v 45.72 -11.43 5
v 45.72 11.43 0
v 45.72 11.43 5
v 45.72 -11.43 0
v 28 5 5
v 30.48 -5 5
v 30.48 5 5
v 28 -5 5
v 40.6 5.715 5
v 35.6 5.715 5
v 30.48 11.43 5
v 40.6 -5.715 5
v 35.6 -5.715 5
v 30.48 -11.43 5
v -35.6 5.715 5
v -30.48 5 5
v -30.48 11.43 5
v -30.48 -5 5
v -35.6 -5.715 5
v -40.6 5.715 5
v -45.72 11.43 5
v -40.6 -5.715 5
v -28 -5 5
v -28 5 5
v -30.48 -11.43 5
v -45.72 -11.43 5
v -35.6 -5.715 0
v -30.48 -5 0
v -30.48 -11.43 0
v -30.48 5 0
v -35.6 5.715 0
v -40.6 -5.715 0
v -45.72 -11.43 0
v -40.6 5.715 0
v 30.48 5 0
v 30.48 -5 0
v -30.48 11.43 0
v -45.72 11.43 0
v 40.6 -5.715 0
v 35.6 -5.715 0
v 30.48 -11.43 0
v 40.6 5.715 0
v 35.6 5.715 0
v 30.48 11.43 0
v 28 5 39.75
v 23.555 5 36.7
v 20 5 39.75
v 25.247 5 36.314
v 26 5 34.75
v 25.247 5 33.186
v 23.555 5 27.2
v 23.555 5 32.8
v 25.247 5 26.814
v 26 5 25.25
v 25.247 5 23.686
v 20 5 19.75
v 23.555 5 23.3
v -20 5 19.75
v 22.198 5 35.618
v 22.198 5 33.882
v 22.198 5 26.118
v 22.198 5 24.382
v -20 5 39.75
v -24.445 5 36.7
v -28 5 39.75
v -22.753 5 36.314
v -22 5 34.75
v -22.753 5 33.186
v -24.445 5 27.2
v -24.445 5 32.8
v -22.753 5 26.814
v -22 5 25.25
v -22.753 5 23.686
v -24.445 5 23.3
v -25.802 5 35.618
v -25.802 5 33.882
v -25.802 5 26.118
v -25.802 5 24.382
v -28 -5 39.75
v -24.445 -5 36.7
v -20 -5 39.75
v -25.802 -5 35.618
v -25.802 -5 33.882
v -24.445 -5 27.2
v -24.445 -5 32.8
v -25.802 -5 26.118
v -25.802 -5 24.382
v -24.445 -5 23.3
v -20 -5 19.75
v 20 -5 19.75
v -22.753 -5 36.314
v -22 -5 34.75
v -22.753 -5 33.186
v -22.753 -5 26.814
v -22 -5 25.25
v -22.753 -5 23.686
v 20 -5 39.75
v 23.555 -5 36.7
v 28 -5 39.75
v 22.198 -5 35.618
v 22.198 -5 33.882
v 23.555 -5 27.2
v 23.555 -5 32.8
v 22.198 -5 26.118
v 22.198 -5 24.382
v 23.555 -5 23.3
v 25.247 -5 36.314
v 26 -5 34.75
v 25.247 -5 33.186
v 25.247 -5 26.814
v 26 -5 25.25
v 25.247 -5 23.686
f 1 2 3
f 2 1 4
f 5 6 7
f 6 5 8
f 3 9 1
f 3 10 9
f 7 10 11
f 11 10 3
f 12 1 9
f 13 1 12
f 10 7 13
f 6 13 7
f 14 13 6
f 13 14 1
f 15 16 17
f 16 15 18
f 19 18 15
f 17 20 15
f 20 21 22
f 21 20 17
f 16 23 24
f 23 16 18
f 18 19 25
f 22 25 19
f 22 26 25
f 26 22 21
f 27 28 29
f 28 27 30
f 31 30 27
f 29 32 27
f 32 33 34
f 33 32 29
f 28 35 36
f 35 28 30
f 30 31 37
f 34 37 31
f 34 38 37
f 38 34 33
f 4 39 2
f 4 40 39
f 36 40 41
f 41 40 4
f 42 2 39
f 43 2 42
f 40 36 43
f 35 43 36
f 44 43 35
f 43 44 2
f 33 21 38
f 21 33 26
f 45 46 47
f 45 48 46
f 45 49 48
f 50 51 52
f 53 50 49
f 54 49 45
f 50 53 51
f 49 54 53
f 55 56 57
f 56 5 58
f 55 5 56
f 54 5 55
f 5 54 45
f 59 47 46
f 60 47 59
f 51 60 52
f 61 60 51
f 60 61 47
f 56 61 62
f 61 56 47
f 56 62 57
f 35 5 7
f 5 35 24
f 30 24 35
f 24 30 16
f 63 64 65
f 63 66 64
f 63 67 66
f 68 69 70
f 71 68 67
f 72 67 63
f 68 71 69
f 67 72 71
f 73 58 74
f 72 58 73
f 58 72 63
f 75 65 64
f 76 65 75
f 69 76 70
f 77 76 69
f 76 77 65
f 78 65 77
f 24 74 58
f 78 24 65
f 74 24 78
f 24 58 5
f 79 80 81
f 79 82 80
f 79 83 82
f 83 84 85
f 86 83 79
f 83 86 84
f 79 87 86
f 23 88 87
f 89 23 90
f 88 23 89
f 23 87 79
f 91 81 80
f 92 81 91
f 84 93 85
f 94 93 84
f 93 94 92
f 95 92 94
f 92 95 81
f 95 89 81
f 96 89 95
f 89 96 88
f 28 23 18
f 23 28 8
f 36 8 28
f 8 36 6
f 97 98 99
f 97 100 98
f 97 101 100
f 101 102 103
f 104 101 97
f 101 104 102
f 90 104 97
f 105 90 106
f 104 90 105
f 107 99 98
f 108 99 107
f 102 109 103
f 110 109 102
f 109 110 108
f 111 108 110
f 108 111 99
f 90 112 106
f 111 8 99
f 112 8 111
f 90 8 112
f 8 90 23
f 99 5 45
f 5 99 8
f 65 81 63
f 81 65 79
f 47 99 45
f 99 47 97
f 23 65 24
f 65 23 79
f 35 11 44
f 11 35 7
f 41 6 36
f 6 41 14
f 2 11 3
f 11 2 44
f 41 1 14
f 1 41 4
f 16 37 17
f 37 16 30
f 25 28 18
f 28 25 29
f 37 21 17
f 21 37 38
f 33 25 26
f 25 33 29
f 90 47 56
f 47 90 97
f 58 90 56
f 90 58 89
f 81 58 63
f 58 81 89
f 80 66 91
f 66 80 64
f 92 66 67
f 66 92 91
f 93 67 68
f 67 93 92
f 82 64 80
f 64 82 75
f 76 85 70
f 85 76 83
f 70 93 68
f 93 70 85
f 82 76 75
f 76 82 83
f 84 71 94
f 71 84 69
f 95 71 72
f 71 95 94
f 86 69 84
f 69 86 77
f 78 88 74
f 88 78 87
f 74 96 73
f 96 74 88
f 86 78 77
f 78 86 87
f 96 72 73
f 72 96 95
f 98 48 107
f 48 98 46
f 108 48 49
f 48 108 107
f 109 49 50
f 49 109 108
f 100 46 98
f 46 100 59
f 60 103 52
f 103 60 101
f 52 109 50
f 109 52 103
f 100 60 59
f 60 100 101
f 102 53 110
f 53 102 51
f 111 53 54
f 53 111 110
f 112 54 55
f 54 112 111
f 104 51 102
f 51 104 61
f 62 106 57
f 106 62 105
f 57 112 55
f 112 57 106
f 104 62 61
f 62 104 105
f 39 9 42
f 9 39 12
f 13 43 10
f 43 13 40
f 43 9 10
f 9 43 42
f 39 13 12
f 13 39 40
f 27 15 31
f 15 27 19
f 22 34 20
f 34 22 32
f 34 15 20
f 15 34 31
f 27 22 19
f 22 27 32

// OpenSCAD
//Variables to change

servo_w = 40;
servo_h = 20;
servo_hole_diameter = 4;
servo_hole_distance_from_top_of_servo = 5; 
servo_hole_seperation = 9.5;


center_of_rotation = 30;



// Do not change variables unless you know what you're doing
servo_hole_r = servo_hole_diameter/2;
screw_hole_r = 2.5;     // automaticly 

// Two conditional statments; if servo_w < 50, make base certain width. Else increase it. That is it.

if (servo_w < 51) {
    // base_w must be divisable by 7.62
    base_w=7.62*12;  //91.44

    base_l = 10;
    base_h = 5;

    servo_module_w = servo_w+servo_hole_diameter*4;
    servo_module_l = base_l;
    servo_module_h = center_of_rotation+(servo_hole_seperation/2)+servo_hole_distance_from_top_of_servo;


    difference(){
        // Main body
        union(){
            //Base
            translate([0,0,base_h/2])
            cube([base_w,base_l,base_h],center=true);
            
            //Servo module
            translate([0,0,servo_module_h/2])
            cube([servo_module_w,servo_module_l,servo_module_h],center=true);
            
            // Sliding bars
            sliding_w=7.62*2;
            translate([base_w/2-sliding_w/2,0,base_h/2])
            cube([sliding_w,7.62*3/2+7.62*3/2,base_h],center=true);
            
            translate([-base_w/2+sliding_w/2,0,base_h/2])
            cube([sliding_w,7.62*3/2+7.62*3/2,base_h],center=true);
            
        }

        // Servo body hole
        translate([0,0,servo_module_h])
        cube([servo_w,500,servo_h*2],center=true);
        
        // Servo mounting holes
            //top left
            translate([-(servo_w/2+servo_hole_diameter),30,servo_module_h-servo_hole_distance_from_top_of_servo])
            rotate([90,0,0])
            cylinder(h=100,r=servo_hole_r);
            //bottom left
            translate([-(servo_w/2+servo_hole_diameter),30,servo_module_h-servo_hole_distance_from_top_of_servo-servo_hole_seperation])
            rotate([90,0,0])
            cylinder(h=100,r=servo_hole_r);
        
            //top right
            translate([(servo_w/2+servo_hole_diameter),30,servo_module_h-servo_hole_distance_from_top_of_servo])
            rotate([90,0,0])
            cylinder(h=100,r=servo_hole_r);
            //bottom right
            translate([(servo_w/2+servo_hole_diameter),30,servo_module_h-servo_hole_distance_from_top_of_servo-servo_hole_seperation])
            rotate([90,0,0])
            cylinder(h=100,r=servo_hole_r);
            
            
        // Screw Holes
        translate([base_w/2-7.62,0,0])
        cylinder(h=100,r=screw_hole_r);
        
        translate([-base_w/2+7.62,0,0])
        cylinder(h=100,r=screw_hole_r);
        
        // Screw RECTANGLES!    
        translate([base_w/2-7.62,0,0])
        cube([2*screw_hole_r,7.62*3/2,100],center=true);
        
        translate([-base_w/2+7.62,0,0])
        cube([2*screw_hole_r,7.62*3/2,100],center=true);
    }
    
}

if (servo_w >= 51) {
    base_w=7.62*16;     //121.92

    base_l = 10;
    base_h = 5;

    servo_module_w = servo_w+servo_hole_diameter*4;
    servo_module_l = base_l;
    servo_module_h = center_of_rotation+(servo_hole_seperation/2)+servo_hole_distance_from_top_of_servo;


    difference(){
        // Main body
        union(){
            //Base
            translate([0,0,base_h/2])
            cube([base_w,base_l,base_h],center=true);
            
            //Servo module
            translate([0,0,servo_module_h/2])
            cube([servo_module_w,servo_module_l,servo_module_h],center=true);
            
            // Sliding bars
            sliding_w=7.62*2;
            translate([base_w/2-sliding_w/2,0,base_h/2])
            cube([sliding_w,7.62*3/2+7.62*3/2,base_h],center=true);
            
            translate([-base_w/2+sliding_w/2,0,base_h/2])
            cube([sliding_w,7.62*3/2+7.62*3/2,base_h],center=true);
            
        }

        // Servo body hole
        translate([0,0,servo_module_h])
        cube([servo_w,500,servo_h*2],center=true);
        
        // Servo mounting holes
            //top left
            translate([-(servo_w/2+servo_hole_diameter),30,servo_module_h-servo_hole_distance_from_top_of_servo])
            rotate([90,0,0])
            cylinder(h=100,r=servo_hole_r);
            //bottom left
            translate([-(servo_w/2+servo_hole_diameter),30,servo_module_h-servo_hole_distance_from_top_of_servo-servo_hole_seperation])
            rotate([90,0,0])
            cylinder(h=100,r=servo_hole_r);
        
            //top right
            translate([(servo_w/2+servo_hole_diameter),30,servo_module_h-servo_hole_distance_from_top_of_servo])
            rotate([90,0,0])
            cylinder(h=100,r=servo_hole_r);
            //bottom right
            translate([(servo_w/2+servo_hole_diameter),30,servo_module_h-servo_hole_distance_from_top_of_servo-servo_hole_seperation])
            rotate([90,0,0])
            cylinder(h=100,r=servo_hole_r);
            
            
        // Screw Holes
        translate([base_w/2-7.62,0,0])
        cylinder(h=100,r=screw_hole_r);
        
        translate([-base_w/2+7.62,0,0])
        cylinder(h=100,r=screw_hole_r);

        // Screw RECTANGLES!    
        translate([base_w/2-7.62,0,0])
        cube([2*screw_hole_r,7.62*3/2,100],center=true);
        
        translate([-base_w/2+7.62,0,0])
        cube([2*screw_hole_r,7.62*3/2,100],center=true);
    }
}
